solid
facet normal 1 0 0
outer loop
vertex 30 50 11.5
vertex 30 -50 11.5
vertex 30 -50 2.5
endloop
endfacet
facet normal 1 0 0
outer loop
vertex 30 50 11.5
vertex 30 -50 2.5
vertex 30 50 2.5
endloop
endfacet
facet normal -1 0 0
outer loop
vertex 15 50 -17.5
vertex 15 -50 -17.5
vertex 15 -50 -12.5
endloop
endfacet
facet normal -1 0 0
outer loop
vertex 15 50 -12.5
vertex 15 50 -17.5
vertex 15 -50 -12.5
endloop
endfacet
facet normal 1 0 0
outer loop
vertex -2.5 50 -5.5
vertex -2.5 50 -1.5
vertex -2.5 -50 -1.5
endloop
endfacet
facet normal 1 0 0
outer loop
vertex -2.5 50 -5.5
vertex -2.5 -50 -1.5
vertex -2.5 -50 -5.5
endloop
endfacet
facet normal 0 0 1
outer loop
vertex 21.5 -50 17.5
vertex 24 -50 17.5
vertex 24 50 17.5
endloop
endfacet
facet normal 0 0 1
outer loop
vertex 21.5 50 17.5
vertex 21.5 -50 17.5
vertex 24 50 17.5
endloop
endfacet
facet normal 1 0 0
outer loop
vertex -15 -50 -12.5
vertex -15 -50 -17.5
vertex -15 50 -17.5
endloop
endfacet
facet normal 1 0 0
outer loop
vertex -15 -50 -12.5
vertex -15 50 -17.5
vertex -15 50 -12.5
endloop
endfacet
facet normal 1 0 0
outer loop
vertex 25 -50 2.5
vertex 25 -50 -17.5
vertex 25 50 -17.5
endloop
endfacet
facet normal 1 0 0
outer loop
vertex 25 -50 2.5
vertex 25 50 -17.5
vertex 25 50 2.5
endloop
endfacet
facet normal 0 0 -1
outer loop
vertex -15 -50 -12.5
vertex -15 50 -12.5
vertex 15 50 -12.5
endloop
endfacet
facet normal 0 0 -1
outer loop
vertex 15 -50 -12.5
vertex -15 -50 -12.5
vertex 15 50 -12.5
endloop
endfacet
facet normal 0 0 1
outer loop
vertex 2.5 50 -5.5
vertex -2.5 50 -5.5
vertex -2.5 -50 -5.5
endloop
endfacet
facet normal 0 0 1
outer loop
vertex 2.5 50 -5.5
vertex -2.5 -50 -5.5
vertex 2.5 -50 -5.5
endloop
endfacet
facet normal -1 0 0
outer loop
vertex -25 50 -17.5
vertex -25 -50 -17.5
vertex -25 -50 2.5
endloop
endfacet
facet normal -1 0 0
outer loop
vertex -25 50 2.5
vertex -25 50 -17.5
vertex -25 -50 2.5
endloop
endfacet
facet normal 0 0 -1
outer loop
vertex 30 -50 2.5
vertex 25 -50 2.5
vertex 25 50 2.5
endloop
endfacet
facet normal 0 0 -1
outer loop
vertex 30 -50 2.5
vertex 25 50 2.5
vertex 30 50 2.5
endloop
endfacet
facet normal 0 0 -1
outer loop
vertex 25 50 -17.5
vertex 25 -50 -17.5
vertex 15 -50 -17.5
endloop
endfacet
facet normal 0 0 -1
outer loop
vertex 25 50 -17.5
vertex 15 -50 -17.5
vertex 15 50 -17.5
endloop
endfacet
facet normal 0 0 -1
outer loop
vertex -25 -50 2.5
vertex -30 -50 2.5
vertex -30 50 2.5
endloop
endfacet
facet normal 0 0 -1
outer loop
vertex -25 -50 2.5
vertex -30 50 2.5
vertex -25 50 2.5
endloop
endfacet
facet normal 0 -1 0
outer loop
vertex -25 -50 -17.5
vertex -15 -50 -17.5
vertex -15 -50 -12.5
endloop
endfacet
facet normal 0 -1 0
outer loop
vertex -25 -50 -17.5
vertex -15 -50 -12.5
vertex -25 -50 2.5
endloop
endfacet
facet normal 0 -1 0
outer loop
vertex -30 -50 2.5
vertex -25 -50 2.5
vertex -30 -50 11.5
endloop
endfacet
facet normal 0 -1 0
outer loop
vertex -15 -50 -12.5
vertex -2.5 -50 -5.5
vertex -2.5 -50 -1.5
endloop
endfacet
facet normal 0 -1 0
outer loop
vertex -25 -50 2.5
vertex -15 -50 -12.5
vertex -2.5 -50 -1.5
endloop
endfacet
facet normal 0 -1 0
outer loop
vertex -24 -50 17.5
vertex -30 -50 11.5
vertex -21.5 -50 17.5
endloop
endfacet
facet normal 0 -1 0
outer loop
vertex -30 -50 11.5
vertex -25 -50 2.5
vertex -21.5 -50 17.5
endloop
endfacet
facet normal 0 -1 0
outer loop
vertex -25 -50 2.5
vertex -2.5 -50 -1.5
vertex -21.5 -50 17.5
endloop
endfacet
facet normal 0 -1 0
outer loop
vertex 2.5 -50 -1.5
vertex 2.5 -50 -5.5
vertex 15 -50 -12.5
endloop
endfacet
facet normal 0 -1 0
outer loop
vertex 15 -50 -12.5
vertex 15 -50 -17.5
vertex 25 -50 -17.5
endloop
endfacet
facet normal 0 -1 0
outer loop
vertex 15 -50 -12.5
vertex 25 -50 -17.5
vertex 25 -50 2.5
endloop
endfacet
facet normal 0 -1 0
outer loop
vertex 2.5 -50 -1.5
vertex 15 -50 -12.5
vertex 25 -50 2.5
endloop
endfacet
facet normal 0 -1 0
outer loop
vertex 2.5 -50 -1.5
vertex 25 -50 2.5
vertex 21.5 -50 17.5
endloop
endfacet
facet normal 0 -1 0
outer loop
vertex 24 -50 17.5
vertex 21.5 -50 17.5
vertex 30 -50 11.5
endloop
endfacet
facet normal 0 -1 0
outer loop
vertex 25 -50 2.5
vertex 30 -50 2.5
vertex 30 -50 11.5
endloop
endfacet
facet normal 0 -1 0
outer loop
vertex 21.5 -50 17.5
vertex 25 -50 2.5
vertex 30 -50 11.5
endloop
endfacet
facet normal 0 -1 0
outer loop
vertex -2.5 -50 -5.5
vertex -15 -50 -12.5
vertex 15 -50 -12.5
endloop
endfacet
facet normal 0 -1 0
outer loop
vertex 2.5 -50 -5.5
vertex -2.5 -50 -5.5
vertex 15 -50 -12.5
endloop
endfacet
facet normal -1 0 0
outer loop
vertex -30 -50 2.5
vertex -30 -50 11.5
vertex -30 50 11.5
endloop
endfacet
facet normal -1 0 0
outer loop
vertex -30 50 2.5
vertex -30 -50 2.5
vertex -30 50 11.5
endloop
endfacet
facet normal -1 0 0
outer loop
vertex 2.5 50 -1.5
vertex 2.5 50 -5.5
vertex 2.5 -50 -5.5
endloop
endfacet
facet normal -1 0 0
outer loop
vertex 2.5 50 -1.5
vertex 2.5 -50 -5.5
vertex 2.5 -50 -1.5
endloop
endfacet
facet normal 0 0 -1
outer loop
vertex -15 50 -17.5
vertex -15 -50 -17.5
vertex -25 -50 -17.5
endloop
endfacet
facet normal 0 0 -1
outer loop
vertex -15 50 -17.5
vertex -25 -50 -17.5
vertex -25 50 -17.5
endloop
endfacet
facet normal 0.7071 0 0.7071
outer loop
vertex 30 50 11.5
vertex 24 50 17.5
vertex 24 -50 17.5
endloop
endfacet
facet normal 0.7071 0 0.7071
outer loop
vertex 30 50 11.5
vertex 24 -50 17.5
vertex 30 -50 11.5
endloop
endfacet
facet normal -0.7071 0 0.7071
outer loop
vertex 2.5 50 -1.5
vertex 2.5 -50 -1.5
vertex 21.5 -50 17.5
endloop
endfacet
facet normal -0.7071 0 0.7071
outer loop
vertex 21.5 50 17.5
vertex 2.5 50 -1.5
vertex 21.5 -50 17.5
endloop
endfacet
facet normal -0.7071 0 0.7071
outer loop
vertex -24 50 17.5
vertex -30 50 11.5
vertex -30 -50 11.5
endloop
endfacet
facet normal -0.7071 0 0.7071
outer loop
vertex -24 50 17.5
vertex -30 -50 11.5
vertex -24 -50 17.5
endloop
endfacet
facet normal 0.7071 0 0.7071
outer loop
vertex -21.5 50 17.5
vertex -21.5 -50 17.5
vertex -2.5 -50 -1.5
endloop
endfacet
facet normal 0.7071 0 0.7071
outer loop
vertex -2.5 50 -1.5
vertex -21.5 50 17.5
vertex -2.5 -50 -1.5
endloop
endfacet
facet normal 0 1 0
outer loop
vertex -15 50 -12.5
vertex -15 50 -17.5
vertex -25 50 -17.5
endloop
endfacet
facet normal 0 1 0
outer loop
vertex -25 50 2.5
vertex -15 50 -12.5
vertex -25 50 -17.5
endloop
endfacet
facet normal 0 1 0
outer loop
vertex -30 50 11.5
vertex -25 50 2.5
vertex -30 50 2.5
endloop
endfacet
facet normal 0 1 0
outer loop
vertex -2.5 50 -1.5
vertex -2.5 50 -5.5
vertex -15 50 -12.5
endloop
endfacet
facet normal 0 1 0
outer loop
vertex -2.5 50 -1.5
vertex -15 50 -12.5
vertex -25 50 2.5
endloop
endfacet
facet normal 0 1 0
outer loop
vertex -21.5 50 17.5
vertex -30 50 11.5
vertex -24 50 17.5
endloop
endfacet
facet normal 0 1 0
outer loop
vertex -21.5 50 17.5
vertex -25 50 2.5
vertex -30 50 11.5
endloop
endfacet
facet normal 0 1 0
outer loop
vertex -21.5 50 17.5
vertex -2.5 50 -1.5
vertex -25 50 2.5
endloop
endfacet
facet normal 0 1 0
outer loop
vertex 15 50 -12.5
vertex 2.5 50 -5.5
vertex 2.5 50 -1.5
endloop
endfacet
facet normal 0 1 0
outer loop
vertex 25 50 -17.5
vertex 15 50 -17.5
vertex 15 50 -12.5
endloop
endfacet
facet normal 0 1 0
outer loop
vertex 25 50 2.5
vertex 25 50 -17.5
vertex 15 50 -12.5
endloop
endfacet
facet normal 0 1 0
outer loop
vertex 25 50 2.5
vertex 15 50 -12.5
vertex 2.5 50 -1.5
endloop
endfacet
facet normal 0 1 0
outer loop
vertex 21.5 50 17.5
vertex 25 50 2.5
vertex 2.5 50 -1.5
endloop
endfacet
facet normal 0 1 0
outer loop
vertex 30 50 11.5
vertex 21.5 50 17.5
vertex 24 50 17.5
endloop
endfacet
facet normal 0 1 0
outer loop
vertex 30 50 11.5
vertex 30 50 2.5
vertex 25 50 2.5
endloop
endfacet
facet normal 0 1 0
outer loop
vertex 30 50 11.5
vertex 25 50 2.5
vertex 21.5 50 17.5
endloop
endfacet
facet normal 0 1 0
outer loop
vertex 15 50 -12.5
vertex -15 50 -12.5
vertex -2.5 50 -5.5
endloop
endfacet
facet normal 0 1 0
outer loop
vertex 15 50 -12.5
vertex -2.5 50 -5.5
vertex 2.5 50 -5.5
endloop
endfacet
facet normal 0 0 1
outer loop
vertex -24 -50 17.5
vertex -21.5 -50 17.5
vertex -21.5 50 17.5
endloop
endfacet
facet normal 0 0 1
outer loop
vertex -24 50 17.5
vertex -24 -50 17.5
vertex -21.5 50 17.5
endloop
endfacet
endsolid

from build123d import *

# Parameters (mm, degrees)
F0_W          = 100
F0_H          = 35
F1_DEPTH      = 30
F2_W          = 5
F2_H          = 20
F2_W_2        = 30
F2_H_2        = 5
F3_DEPTH      = 100
F5_DEPTH      = 100
F5_DEPTH_BACK = 74.2
F7_DEPTH      = 100
F7_DEPTH_BACK = 100.7


with BuildPart() as f1:
    # F0 (on Right) → F1 (new body, symmetric)
    with BuildSketch(Plane.YZ):
        Rectangle(F0_W, F0_H)
    extrude(amount=F1_DEPTH, both=True)

    # F2 (on face) → F3 (cut)
    with BuildSketch(Plane.XZ.offset(50)):
        with Locations((-27.5, -7.5)):
            Rectangle(F2_W, F2_H)
        with Locations((0, -15)):
            Rectangle(F2_W_2, F2_H_2)
        with Locations((27.5, -7.5)):
            Rectangle(F2_W, F2_H)
    extrude(amount=-F3_DEPTH, mode=Mode.SUBTRACT)

    # F4 (on Front) → F5 (cut, two sides)
    with BuildSketch(Plane.XZ) as f5_sk:
        Polygon((30.0000030547, 11.5), (30.0000030547, 17.5), (24, 17.5), align=None)
        Polygon((-30.0000030547, 11.5), (-24, 17.5), (-30.0000030547, 17.5), align=None)
    extrude(amount=-F5_DEPTH, mode=Mode.SUBTRACT)
    extrude(f5_sk.sketch, amount=F5_DEPTH_BACK, mode=Mode.SUBTRACT)

    # F6 (on Front) → F7 (cut, two sides)
    with BuildSketch(Plane.XZ) as f7_sk:
        Polygon((2.5, -5.5), (2.5, -1.5), (21.5, 17.5), (-21.5, 17.5), (-2.5, -1.5), (-2.5, -5.5), align=None)
    extrude(amount=-F7_DEPTH, mode=Mode.SUBTRACT)
    extrude(f7_sk.sketch, amount=F7_DEPTH_BACK, mode=Mode.SUBTRACT)


solid = f1.part
